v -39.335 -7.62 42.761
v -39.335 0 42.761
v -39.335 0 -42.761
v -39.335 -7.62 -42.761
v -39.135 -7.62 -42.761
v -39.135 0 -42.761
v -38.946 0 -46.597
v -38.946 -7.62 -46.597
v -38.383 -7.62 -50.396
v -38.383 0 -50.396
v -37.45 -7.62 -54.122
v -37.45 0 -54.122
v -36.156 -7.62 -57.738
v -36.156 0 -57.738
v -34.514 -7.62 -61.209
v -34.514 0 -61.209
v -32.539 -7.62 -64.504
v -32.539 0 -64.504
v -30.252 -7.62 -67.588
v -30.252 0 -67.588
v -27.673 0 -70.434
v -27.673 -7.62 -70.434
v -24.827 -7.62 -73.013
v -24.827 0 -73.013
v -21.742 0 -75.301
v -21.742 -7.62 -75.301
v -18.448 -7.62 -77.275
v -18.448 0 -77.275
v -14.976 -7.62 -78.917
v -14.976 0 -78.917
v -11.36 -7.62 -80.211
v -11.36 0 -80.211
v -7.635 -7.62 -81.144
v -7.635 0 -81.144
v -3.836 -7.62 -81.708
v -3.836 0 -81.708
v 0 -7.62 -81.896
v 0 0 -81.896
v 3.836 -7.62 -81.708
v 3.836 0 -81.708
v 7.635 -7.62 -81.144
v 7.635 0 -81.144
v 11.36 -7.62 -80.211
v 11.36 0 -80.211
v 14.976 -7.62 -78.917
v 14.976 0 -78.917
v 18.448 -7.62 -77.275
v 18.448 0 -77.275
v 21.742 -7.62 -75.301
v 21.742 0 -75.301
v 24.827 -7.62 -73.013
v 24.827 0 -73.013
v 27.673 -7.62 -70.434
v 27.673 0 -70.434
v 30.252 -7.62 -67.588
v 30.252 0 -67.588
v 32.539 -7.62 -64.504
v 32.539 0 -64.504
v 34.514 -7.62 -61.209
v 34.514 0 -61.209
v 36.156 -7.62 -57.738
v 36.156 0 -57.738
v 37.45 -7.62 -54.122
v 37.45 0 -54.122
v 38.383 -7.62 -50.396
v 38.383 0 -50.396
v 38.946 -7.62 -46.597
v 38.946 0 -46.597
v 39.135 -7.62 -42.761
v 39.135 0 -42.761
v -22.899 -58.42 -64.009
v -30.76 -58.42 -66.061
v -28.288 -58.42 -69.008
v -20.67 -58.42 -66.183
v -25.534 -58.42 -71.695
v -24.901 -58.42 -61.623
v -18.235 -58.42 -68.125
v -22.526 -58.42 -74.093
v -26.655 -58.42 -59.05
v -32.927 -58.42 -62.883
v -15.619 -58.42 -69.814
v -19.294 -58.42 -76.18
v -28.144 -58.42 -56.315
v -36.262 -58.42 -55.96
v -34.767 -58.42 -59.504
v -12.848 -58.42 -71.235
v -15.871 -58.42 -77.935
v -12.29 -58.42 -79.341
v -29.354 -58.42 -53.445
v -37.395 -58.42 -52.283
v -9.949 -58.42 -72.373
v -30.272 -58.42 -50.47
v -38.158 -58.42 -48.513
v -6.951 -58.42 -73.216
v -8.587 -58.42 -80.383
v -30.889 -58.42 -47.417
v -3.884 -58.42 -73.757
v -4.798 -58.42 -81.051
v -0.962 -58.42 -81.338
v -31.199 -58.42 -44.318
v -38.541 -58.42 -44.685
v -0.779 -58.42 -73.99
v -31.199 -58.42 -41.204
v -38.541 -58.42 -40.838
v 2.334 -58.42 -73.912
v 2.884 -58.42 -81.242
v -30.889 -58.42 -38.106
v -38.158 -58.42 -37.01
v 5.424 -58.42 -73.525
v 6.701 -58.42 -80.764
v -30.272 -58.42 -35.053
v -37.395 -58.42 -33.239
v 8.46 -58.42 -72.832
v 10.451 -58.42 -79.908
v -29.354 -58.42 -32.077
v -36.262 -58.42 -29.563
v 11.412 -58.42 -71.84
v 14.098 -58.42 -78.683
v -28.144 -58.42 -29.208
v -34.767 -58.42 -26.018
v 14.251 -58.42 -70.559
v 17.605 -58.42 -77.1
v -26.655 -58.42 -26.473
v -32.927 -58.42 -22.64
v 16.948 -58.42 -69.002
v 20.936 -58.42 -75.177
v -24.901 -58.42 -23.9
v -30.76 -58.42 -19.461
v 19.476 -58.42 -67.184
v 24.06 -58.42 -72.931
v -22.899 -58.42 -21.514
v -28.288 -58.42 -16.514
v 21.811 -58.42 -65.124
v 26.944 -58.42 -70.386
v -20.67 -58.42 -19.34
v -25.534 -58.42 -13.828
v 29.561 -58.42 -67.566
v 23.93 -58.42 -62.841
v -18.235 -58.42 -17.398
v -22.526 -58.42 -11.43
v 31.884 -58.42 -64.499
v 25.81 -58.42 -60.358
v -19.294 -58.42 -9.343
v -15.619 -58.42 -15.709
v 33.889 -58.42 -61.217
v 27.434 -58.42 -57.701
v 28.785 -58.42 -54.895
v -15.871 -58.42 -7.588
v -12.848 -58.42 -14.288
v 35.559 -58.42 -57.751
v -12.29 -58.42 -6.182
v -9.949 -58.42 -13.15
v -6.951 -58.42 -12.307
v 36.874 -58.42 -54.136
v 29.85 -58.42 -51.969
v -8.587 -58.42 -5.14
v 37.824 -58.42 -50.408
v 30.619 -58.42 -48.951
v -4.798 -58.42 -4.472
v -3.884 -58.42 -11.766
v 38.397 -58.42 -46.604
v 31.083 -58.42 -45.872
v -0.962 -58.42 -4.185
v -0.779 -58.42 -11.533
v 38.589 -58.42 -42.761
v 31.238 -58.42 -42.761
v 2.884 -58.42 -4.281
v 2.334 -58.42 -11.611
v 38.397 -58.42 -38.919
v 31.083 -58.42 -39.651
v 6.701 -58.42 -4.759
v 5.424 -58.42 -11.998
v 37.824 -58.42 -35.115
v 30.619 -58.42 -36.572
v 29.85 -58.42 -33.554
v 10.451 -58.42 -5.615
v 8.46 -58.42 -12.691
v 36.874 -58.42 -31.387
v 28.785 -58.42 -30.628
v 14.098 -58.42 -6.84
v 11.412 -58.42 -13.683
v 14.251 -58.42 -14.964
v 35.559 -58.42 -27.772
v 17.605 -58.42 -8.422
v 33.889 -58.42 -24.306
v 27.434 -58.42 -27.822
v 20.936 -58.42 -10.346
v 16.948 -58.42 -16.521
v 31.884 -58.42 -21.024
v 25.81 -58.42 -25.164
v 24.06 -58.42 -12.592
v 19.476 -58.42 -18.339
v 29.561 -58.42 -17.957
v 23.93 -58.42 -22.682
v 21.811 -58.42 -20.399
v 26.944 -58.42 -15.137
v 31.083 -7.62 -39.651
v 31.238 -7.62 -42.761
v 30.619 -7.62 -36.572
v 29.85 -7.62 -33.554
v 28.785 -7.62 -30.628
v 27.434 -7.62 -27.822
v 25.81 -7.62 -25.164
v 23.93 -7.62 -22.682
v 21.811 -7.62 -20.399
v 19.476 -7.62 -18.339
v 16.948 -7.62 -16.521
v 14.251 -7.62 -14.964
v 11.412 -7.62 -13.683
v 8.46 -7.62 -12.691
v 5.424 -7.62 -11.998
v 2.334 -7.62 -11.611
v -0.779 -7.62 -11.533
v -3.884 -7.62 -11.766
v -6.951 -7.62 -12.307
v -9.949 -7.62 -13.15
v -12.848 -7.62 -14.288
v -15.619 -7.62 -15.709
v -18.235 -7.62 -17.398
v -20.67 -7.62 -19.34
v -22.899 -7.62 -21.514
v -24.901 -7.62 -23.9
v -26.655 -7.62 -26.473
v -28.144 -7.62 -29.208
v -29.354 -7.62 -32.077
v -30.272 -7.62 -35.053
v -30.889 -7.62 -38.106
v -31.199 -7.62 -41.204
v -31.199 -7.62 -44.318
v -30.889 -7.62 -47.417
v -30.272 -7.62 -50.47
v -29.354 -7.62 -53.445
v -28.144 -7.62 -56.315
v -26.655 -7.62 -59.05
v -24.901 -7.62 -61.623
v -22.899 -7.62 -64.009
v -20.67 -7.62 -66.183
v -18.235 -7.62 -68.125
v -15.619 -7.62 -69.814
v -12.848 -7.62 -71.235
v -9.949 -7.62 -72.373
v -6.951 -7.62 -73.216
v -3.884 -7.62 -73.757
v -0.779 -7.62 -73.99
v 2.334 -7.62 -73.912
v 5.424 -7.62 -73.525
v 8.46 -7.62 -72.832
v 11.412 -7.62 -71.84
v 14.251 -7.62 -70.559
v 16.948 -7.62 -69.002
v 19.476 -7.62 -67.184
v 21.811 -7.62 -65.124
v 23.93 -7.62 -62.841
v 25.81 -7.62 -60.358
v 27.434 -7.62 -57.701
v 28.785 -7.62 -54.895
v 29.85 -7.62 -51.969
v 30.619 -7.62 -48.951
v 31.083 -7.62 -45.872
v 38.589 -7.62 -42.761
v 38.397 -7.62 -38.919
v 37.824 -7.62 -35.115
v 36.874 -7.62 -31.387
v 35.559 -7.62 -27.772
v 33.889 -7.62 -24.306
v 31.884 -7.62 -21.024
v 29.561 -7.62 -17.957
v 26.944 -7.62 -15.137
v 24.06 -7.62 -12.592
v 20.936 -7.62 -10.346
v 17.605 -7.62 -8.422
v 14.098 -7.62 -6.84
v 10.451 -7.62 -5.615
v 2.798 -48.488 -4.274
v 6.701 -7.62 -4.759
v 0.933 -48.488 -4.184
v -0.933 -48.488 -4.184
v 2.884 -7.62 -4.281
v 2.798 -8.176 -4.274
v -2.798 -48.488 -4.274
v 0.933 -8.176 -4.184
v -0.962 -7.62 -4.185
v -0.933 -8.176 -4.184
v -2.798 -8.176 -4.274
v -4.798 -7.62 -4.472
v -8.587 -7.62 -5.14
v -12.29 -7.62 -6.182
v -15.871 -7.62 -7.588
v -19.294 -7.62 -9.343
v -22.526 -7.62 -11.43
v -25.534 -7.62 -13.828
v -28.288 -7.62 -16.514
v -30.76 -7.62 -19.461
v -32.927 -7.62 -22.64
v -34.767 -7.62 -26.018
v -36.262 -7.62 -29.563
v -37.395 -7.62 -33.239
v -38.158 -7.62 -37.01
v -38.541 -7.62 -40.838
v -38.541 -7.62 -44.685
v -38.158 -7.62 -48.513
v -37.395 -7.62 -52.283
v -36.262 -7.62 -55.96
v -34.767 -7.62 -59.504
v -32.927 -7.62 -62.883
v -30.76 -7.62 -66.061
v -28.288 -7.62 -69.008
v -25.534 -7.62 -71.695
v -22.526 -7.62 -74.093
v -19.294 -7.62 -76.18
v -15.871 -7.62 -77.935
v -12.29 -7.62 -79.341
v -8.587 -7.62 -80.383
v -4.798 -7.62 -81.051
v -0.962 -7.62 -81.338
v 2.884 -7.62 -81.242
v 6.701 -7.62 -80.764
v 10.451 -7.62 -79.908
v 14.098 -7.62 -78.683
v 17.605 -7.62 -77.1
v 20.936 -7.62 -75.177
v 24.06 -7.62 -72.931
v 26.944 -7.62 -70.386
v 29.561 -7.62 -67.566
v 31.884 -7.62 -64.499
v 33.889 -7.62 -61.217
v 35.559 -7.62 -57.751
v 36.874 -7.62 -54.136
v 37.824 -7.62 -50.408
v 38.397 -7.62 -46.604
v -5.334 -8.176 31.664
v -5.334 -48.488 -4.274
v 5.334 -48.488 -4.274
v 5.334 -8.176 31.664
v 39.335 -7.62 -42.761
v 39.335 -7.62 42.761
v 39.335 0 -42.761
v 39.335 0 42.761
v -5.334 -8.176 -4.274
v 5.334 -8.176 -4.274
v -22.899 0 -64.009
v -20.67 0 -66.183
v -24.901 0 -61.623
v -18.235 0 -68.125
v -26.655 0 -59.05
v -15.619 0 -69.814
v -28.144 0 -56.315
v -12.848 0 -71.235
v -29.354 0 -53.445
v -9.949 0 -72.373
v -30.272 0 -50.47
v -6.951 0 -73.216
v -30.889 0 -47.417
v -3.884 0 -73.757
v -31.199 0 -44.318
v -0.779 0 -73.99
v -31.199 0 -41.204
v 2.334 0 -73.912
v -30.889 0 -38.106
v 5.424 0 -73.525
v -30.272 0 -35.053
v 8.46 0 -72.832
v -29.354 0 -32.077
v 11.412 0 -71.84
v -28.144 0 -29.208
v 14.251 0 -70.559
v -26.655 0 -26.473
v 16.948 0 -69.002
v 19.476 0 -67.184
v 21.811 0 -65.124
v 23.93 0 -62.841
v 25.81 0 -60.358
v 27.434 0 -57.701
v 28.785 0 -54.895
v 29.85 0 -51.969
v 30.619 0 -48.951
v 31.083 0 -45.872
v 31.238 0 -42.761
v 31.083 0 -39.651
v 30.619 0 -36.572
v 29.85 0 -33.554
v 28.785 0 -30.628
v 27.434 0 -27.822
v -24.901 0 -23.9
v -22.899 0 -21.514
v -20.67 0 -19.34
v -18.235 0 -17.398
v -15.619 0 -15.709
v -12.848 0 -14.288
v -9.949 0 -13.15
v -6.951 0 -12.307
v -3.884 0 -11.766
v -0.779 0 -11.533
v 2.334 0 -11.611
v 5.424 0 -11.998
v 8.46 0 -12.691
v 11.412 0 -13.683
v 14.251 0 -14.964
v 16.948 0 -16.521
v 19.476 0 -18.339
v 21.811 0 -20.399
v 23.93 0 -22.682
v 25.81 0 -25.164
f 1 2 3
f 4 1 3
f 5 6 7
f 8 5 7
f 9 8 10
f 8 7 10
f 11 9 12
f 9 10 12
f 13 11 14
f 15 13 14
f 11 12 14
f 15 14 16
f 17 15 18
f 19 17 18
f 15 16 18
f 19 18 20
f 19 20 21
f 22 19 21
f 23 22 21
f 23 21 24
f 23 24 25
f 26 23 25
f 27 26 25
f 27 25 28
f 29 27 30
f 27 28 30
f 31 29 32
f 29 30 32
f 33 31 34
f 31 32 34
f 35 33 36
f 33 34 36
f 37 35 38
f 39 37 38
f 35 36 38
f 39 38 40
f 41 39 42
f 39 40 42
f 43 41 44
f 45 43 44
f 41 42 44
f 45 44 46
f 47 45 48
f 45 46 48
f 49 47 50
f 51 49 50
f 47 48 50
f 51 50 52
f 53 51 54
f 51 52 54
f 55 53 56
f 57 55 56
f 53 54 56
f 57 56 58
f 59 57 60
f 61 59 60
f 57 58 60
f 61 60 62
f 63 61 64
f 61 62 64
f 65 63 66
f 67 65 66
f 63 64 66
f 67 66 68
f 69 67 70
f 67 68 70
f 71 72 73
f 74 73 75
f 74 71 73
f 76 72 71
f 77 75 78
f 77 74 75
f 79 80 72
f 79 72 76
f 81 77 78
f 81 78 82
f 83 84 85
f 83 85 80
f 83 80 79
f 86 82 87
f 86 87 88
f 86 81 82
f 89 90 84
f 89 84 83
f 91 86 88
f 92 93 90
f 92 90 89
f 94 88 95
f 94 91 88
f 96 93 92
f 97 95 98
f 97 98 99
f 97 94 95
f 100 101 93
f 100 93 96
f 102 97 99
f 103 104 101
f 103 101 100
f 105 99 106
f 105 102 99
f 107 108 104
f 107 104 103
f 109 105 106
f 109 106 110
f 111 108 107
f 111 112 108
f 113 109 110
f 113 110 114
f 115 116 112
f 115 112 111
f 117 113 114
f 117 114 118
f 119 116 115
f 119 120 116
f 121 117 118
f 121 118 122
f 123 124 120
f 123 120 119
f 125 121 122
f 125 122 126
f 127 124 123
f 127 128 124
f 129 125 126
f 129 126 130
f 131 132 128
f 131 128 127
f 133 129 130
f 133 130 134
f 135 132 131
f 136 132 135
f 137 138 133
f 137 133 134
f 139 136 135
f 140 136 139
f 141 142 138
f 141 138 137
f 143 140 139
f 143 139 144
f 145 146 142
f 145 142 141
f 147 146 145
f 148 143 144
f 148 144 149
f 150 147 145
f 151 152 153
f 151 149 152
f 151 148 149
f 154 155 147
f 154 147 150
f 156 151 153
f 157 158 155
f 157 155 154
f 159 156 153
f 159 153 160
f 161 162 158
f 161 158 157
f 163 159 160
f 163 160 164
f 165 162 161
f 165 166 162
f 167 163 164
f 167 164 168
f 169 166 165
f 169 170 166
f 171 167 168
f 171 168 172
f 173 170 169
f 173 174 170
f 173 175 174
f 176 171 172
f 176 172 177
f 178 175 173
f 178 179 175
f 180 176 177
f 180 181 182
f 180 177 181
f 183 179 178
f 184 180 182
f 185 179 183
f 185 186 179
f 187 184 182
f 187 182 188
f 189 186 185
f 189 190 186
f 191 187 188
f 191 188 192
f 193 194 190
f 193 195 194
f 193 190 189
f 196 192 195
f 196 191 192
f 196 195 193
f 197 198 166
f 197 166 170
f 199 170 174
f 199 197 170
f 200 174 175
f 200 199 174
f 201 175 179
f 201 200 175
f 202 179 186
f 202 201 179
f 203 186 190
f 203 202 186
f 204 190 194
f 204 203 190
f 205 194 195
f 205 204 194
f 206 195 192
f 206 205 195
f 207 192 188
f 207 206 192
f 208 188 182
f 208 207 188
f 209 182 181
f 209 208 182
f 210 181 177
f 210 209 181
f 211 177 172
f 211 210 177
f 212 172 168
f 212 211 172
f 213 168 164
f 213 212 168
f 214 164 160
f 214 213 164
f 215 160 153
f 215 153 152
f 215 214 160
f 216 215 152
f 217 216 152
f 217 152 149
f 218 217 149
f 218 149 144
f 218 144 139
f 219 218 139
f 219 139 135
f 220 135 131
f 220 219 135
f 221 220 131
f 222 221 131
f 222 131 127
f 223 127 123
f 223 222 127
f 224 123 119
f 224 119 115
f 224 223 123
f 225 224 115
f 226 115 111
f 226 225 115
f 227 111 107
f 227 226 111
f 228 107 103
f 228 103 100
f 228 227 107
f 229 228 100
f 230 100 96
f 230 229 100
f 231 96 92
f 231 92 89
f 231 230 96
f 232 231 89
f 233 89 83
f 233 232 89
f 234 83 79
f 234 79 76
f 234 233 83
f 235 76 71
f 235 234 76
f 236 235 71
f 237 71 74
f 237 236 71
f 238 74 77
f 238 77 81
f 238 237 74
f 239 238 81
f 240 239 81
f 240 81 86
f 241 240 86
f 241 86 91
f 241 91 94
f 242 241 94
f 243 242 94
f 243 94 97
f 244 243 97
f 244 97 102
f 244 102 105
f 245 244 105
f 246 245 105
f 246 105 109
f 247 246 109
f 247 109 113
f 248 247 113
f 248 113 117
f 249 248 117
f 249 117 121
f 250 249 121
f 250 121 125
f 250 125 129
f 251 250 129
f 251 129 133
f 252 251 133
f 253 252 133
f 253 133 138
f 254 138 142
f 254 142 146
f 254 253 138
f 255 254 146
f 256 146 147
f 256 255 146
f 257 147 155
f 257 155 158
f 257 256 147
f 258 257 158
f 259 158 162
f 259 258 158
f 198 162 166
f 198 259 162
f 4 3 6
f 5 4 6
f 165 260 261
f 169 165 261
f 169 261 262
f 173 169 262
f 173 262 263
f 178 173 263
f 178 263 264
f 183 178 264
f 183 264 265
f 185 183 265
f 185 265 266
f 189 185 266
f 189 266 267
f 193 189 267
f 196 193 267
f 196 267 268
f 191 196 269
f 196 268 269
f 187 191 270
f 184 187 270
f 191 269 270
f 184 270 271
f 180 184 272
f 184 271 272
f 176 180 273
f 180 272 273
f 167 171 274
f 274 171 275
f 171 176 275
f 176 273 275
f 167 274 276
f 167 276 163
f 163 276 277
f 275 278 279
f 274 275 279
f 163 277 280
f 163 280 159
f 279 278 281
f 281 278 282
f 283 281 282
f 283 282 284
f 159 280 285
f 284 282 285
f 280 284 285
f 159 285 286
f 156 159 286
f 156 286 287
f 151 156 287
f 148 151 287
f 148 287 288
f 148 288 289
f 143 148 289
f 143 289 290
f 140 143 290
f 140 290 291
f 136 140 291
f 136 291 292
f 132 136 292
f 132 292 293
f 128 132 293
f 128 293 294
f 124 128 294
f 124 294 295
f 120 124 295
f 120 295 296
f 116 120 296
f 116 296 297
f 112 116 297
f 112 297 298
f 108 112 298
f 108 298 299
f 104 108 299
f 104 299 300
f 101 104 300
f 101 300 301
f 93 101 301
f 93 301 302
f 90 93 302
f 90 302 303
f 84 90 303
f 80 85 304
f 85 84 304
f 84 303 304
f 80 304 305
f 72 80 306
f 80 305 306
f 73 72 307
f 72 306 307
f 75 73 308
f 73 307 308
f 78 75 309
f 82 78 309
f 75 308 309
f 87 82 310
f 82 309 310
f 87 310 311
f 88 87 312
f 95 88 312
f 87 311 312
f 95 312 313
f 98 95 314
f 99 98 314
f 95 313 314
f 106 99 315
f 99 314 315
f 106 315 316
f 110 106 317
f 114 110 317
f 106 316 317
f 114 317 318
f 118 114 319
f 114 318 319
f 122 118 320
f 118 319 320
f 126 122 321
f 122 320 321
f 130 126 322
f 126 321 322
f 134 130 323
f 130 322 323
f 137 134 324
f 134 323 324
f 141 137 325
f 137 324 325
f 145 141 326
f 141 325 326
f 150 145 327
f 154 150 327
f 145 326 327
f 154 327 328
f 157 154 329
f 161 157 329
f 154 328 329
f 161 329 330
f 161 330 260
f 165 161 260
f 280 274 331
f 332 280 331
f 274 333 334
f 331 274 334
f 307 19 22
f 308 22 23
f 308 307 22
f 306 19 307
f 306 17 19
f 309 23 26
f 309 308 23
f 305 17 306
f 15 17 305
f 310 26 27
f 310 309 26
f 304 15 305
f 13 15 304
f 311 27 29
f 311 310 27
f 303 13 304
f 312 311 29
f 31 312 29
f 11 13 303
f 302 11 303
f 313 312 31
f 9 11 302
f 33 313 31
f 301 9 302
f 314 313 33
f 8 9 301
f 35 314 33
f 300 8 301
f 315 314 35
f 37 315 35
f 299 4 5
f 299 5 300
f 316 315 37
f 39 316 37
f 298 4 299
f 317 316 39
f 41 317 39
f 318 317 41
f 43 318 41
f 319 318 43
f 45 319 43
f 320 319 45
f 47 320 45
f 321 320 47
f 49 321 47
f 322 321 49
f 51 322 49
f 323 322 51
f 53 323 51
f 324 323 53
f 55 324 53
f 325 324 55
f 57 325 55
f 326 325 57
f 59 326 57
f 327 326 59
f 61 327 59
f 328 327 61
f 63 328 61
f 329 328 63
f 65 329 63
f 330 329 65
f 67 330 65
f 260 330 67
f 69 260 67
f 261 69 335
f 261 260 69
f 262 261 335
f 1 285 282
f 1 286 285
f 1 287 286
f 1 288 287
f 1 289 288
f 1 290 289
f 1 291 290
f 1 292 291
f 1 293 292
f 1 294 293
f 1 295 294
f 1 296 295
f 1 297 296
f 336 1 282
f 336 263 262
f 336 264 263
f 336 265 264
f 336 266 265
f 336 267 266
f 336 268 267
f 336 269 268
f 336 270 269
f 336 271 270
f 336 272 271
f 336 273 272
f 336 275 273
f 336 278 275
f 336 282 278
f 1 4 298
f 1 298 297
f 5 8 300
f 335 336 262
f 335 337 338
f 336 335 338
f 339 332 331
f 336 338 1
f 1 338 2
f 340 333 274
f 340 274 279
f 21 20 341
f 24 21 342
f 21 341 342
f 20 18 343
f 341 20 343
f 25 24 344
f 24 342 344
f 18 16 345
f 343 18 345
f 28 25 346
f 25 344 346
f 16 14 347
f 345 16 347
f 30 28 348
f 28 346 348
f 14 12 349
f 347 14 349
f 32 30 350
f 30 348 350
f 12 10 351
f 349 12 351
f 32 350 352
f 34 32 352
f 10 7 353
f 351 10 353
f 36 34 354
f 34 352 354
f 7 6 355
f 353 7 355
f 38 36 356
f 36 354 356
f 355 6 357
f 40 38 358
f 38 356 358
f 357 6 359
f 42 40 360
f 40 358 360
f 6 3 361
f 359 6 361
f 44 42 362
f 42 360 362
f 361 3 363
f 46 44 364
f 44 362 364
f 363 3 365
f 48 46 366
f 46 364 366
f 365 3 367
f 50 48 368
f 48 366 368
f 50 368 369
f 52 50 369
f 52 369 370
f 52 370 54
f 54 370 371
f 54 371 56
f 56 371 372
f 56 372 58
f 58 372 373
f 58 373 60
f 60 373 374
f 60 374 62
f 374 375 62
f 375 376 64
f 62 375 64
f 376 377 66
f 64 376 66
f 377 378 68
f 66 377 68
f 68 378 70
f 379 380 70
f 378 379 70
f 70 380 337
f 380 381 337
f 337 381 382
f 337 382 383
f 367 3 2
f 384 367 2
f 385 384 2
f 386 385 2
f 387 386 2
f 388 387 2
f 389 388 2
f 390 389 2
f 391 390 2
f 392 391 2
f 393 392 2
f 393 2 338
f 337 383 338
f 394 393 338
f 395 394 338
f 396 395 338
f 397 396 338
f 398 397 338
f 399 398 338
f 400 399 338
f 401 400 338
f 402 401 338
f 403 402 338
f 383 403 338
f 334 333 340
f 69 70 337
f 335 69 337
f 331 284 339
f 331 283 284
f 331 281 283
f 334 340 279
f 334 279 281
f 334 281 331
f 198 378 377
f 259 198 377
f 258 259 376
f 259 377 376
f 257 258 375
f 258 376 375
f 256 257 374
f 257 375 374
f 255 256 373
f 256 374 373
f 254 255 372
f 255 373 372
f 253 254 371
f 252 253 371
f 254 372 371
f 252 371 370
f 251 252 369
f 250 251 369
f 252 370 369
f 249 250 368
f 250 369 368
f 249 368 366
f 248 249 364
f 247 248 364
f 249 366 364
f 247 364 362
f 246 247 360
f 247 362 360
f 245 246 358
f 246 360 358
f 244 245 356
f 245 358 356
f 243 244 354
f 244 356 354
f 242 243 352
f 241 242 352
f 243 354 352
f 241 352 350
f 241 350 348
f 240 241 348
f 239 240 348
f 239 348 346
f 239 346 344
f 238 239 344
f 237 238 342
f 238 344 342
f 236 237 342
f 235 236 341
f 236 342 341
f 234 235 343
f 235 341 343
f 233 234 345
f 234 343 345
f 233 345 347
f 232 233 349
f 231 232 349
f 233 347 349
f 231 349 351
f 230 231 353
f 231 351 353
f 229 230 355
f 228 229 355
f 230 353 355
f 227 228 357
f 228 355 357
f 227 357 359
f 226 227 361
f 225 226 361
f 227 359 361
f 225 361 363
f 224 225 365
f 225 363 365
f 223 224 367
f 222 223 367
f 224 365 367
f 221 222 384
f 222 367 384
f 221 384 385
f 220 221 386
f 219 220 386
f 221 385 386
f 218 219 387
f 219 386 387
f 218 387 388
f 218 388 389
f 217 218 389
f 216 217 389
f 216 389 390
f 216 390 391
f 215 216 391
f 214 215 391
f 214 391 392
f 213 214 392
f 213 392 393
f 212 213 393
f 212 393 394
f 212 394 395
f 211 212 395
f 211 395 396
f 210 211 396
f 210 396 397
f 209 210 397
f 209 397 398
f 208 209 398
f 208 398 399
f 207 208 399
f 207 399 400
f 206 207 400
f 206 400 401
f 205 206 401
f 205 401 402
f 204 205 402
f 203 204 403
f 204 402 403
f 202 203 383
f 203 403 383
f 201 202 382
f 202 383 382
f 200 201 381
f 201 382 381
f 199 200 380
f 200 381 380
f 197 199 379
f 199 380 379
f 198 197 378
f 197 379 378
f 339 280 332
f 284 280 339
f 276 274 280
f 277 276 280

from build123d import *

# Parameters (mm, degrees)
F1_DEPTH = 7.62
F2_R     = 38.5887386993
F2_R_2   = 31.2378777005
F3_DEPTH = 50.8
F4_W     = 40.311823599
F4_H     = 35.9383700415
F5_DEPTH = 5.334
F7_DEPTH = 44.6695281482


with BuildPart() as f1:
    # F0 (on Front) → F1 (new body)
    with BuildSketch(Plane.XZ):
        with BuildLine():
            Line((39.3345281482, -13.8564798981), (39.3345281482, 42.7613966167))
            Line((39.3345281482, 42.7613966167), (-39.3345281482, 42.7613966167))
            Line((-39.3345281482, 42.7613966167), (-39.3345281482, -13.8564798981))
            Line((-39.3345281482, -13.8564798981), (-39.3345281482, -42.7613966167))
            Line((-39.3345281482, -42.7613966167), (-39.1348331809, -42.7613966167))
            ThreePointArc((-39.1348331809, -42.7613966167), (0, -3.6265634358), (39.1348331809, -42.7613966167))
            Line((39.1348331809, -42.7613966167), (39.3345281482, -42.7613966167))
            Line((39.3345281482, -42.7613966167), (39.3345281482, -13.8564798981))
        make_face()
        with BuildLine():
            ThreePointArc((-39.1348331809, -42.7613966167), (0, -81.8962297976), (39.1348331809, -42.7613966167))
            Line((39.1348331809, -42.7613966167), (31.2378777005, -42.7613966167))
            ThreePointArc((31.2378777005, -42.7613966167), (0, -73.9992743172), (-31.2378777005, -42.7613966167))
            Line((-31.2378777005, -42.7613966167), (-39.1348331809, -42.7613966167))
        make_face()
        with BuildLine():
            Line((31.2378777005, -42.7613966167), (39.1348331809, -42.7613966167))
            ThreePointArc((39.1348331809, -42.7613966167), (0, -3.6265634358), (-39.1348331809, -42.7613966167))
            Line((-39.1348331809, -42.7613966167), (-31.2378777005, -42.7613966167))
            ThreePointArc((-31.2378777005, -42.7613966167), (0, -11.5235189162), (31.2378777005, -42.7613966167))
        make_face()
    extrude(amount=F1_DEPTH)

    # F2 (on face) → F3 (join)
    with BuildSketch(Plane.XZ.offset(7.62)):
        with Locations((0, -42.7613966167)):
            Circle(F2_R)
        with Locations((0, -42.7613966167)):
            Circle(F2_R_2, mode=Mode.SUBTRACT)
    extrude(amount=F3_DEPTH)

    # F4 (on Right) → F5 (join, symmetric)
    with BuildSketch(Plane.YZ):
        with Locations((-28.3323661424, 13.6949443258)):
            Rectangle(F4_W, F4_H)
    extrude(amount=F5_DEPTH, both=True)

    # F6 (on face) → F7 (cut, through all)
    with BuildSketch(Plane.YZ.offset(5.334)):
        Polygon((-48.4882779419, 31.6641293466), (-48.4882779419, -4.2742406949), (-8.1764543429, 31.6641293466), align=None)
    extrude(amount=-F7_DEPTH, mode=Mode.SUBTRACT)


solid = f1.part
